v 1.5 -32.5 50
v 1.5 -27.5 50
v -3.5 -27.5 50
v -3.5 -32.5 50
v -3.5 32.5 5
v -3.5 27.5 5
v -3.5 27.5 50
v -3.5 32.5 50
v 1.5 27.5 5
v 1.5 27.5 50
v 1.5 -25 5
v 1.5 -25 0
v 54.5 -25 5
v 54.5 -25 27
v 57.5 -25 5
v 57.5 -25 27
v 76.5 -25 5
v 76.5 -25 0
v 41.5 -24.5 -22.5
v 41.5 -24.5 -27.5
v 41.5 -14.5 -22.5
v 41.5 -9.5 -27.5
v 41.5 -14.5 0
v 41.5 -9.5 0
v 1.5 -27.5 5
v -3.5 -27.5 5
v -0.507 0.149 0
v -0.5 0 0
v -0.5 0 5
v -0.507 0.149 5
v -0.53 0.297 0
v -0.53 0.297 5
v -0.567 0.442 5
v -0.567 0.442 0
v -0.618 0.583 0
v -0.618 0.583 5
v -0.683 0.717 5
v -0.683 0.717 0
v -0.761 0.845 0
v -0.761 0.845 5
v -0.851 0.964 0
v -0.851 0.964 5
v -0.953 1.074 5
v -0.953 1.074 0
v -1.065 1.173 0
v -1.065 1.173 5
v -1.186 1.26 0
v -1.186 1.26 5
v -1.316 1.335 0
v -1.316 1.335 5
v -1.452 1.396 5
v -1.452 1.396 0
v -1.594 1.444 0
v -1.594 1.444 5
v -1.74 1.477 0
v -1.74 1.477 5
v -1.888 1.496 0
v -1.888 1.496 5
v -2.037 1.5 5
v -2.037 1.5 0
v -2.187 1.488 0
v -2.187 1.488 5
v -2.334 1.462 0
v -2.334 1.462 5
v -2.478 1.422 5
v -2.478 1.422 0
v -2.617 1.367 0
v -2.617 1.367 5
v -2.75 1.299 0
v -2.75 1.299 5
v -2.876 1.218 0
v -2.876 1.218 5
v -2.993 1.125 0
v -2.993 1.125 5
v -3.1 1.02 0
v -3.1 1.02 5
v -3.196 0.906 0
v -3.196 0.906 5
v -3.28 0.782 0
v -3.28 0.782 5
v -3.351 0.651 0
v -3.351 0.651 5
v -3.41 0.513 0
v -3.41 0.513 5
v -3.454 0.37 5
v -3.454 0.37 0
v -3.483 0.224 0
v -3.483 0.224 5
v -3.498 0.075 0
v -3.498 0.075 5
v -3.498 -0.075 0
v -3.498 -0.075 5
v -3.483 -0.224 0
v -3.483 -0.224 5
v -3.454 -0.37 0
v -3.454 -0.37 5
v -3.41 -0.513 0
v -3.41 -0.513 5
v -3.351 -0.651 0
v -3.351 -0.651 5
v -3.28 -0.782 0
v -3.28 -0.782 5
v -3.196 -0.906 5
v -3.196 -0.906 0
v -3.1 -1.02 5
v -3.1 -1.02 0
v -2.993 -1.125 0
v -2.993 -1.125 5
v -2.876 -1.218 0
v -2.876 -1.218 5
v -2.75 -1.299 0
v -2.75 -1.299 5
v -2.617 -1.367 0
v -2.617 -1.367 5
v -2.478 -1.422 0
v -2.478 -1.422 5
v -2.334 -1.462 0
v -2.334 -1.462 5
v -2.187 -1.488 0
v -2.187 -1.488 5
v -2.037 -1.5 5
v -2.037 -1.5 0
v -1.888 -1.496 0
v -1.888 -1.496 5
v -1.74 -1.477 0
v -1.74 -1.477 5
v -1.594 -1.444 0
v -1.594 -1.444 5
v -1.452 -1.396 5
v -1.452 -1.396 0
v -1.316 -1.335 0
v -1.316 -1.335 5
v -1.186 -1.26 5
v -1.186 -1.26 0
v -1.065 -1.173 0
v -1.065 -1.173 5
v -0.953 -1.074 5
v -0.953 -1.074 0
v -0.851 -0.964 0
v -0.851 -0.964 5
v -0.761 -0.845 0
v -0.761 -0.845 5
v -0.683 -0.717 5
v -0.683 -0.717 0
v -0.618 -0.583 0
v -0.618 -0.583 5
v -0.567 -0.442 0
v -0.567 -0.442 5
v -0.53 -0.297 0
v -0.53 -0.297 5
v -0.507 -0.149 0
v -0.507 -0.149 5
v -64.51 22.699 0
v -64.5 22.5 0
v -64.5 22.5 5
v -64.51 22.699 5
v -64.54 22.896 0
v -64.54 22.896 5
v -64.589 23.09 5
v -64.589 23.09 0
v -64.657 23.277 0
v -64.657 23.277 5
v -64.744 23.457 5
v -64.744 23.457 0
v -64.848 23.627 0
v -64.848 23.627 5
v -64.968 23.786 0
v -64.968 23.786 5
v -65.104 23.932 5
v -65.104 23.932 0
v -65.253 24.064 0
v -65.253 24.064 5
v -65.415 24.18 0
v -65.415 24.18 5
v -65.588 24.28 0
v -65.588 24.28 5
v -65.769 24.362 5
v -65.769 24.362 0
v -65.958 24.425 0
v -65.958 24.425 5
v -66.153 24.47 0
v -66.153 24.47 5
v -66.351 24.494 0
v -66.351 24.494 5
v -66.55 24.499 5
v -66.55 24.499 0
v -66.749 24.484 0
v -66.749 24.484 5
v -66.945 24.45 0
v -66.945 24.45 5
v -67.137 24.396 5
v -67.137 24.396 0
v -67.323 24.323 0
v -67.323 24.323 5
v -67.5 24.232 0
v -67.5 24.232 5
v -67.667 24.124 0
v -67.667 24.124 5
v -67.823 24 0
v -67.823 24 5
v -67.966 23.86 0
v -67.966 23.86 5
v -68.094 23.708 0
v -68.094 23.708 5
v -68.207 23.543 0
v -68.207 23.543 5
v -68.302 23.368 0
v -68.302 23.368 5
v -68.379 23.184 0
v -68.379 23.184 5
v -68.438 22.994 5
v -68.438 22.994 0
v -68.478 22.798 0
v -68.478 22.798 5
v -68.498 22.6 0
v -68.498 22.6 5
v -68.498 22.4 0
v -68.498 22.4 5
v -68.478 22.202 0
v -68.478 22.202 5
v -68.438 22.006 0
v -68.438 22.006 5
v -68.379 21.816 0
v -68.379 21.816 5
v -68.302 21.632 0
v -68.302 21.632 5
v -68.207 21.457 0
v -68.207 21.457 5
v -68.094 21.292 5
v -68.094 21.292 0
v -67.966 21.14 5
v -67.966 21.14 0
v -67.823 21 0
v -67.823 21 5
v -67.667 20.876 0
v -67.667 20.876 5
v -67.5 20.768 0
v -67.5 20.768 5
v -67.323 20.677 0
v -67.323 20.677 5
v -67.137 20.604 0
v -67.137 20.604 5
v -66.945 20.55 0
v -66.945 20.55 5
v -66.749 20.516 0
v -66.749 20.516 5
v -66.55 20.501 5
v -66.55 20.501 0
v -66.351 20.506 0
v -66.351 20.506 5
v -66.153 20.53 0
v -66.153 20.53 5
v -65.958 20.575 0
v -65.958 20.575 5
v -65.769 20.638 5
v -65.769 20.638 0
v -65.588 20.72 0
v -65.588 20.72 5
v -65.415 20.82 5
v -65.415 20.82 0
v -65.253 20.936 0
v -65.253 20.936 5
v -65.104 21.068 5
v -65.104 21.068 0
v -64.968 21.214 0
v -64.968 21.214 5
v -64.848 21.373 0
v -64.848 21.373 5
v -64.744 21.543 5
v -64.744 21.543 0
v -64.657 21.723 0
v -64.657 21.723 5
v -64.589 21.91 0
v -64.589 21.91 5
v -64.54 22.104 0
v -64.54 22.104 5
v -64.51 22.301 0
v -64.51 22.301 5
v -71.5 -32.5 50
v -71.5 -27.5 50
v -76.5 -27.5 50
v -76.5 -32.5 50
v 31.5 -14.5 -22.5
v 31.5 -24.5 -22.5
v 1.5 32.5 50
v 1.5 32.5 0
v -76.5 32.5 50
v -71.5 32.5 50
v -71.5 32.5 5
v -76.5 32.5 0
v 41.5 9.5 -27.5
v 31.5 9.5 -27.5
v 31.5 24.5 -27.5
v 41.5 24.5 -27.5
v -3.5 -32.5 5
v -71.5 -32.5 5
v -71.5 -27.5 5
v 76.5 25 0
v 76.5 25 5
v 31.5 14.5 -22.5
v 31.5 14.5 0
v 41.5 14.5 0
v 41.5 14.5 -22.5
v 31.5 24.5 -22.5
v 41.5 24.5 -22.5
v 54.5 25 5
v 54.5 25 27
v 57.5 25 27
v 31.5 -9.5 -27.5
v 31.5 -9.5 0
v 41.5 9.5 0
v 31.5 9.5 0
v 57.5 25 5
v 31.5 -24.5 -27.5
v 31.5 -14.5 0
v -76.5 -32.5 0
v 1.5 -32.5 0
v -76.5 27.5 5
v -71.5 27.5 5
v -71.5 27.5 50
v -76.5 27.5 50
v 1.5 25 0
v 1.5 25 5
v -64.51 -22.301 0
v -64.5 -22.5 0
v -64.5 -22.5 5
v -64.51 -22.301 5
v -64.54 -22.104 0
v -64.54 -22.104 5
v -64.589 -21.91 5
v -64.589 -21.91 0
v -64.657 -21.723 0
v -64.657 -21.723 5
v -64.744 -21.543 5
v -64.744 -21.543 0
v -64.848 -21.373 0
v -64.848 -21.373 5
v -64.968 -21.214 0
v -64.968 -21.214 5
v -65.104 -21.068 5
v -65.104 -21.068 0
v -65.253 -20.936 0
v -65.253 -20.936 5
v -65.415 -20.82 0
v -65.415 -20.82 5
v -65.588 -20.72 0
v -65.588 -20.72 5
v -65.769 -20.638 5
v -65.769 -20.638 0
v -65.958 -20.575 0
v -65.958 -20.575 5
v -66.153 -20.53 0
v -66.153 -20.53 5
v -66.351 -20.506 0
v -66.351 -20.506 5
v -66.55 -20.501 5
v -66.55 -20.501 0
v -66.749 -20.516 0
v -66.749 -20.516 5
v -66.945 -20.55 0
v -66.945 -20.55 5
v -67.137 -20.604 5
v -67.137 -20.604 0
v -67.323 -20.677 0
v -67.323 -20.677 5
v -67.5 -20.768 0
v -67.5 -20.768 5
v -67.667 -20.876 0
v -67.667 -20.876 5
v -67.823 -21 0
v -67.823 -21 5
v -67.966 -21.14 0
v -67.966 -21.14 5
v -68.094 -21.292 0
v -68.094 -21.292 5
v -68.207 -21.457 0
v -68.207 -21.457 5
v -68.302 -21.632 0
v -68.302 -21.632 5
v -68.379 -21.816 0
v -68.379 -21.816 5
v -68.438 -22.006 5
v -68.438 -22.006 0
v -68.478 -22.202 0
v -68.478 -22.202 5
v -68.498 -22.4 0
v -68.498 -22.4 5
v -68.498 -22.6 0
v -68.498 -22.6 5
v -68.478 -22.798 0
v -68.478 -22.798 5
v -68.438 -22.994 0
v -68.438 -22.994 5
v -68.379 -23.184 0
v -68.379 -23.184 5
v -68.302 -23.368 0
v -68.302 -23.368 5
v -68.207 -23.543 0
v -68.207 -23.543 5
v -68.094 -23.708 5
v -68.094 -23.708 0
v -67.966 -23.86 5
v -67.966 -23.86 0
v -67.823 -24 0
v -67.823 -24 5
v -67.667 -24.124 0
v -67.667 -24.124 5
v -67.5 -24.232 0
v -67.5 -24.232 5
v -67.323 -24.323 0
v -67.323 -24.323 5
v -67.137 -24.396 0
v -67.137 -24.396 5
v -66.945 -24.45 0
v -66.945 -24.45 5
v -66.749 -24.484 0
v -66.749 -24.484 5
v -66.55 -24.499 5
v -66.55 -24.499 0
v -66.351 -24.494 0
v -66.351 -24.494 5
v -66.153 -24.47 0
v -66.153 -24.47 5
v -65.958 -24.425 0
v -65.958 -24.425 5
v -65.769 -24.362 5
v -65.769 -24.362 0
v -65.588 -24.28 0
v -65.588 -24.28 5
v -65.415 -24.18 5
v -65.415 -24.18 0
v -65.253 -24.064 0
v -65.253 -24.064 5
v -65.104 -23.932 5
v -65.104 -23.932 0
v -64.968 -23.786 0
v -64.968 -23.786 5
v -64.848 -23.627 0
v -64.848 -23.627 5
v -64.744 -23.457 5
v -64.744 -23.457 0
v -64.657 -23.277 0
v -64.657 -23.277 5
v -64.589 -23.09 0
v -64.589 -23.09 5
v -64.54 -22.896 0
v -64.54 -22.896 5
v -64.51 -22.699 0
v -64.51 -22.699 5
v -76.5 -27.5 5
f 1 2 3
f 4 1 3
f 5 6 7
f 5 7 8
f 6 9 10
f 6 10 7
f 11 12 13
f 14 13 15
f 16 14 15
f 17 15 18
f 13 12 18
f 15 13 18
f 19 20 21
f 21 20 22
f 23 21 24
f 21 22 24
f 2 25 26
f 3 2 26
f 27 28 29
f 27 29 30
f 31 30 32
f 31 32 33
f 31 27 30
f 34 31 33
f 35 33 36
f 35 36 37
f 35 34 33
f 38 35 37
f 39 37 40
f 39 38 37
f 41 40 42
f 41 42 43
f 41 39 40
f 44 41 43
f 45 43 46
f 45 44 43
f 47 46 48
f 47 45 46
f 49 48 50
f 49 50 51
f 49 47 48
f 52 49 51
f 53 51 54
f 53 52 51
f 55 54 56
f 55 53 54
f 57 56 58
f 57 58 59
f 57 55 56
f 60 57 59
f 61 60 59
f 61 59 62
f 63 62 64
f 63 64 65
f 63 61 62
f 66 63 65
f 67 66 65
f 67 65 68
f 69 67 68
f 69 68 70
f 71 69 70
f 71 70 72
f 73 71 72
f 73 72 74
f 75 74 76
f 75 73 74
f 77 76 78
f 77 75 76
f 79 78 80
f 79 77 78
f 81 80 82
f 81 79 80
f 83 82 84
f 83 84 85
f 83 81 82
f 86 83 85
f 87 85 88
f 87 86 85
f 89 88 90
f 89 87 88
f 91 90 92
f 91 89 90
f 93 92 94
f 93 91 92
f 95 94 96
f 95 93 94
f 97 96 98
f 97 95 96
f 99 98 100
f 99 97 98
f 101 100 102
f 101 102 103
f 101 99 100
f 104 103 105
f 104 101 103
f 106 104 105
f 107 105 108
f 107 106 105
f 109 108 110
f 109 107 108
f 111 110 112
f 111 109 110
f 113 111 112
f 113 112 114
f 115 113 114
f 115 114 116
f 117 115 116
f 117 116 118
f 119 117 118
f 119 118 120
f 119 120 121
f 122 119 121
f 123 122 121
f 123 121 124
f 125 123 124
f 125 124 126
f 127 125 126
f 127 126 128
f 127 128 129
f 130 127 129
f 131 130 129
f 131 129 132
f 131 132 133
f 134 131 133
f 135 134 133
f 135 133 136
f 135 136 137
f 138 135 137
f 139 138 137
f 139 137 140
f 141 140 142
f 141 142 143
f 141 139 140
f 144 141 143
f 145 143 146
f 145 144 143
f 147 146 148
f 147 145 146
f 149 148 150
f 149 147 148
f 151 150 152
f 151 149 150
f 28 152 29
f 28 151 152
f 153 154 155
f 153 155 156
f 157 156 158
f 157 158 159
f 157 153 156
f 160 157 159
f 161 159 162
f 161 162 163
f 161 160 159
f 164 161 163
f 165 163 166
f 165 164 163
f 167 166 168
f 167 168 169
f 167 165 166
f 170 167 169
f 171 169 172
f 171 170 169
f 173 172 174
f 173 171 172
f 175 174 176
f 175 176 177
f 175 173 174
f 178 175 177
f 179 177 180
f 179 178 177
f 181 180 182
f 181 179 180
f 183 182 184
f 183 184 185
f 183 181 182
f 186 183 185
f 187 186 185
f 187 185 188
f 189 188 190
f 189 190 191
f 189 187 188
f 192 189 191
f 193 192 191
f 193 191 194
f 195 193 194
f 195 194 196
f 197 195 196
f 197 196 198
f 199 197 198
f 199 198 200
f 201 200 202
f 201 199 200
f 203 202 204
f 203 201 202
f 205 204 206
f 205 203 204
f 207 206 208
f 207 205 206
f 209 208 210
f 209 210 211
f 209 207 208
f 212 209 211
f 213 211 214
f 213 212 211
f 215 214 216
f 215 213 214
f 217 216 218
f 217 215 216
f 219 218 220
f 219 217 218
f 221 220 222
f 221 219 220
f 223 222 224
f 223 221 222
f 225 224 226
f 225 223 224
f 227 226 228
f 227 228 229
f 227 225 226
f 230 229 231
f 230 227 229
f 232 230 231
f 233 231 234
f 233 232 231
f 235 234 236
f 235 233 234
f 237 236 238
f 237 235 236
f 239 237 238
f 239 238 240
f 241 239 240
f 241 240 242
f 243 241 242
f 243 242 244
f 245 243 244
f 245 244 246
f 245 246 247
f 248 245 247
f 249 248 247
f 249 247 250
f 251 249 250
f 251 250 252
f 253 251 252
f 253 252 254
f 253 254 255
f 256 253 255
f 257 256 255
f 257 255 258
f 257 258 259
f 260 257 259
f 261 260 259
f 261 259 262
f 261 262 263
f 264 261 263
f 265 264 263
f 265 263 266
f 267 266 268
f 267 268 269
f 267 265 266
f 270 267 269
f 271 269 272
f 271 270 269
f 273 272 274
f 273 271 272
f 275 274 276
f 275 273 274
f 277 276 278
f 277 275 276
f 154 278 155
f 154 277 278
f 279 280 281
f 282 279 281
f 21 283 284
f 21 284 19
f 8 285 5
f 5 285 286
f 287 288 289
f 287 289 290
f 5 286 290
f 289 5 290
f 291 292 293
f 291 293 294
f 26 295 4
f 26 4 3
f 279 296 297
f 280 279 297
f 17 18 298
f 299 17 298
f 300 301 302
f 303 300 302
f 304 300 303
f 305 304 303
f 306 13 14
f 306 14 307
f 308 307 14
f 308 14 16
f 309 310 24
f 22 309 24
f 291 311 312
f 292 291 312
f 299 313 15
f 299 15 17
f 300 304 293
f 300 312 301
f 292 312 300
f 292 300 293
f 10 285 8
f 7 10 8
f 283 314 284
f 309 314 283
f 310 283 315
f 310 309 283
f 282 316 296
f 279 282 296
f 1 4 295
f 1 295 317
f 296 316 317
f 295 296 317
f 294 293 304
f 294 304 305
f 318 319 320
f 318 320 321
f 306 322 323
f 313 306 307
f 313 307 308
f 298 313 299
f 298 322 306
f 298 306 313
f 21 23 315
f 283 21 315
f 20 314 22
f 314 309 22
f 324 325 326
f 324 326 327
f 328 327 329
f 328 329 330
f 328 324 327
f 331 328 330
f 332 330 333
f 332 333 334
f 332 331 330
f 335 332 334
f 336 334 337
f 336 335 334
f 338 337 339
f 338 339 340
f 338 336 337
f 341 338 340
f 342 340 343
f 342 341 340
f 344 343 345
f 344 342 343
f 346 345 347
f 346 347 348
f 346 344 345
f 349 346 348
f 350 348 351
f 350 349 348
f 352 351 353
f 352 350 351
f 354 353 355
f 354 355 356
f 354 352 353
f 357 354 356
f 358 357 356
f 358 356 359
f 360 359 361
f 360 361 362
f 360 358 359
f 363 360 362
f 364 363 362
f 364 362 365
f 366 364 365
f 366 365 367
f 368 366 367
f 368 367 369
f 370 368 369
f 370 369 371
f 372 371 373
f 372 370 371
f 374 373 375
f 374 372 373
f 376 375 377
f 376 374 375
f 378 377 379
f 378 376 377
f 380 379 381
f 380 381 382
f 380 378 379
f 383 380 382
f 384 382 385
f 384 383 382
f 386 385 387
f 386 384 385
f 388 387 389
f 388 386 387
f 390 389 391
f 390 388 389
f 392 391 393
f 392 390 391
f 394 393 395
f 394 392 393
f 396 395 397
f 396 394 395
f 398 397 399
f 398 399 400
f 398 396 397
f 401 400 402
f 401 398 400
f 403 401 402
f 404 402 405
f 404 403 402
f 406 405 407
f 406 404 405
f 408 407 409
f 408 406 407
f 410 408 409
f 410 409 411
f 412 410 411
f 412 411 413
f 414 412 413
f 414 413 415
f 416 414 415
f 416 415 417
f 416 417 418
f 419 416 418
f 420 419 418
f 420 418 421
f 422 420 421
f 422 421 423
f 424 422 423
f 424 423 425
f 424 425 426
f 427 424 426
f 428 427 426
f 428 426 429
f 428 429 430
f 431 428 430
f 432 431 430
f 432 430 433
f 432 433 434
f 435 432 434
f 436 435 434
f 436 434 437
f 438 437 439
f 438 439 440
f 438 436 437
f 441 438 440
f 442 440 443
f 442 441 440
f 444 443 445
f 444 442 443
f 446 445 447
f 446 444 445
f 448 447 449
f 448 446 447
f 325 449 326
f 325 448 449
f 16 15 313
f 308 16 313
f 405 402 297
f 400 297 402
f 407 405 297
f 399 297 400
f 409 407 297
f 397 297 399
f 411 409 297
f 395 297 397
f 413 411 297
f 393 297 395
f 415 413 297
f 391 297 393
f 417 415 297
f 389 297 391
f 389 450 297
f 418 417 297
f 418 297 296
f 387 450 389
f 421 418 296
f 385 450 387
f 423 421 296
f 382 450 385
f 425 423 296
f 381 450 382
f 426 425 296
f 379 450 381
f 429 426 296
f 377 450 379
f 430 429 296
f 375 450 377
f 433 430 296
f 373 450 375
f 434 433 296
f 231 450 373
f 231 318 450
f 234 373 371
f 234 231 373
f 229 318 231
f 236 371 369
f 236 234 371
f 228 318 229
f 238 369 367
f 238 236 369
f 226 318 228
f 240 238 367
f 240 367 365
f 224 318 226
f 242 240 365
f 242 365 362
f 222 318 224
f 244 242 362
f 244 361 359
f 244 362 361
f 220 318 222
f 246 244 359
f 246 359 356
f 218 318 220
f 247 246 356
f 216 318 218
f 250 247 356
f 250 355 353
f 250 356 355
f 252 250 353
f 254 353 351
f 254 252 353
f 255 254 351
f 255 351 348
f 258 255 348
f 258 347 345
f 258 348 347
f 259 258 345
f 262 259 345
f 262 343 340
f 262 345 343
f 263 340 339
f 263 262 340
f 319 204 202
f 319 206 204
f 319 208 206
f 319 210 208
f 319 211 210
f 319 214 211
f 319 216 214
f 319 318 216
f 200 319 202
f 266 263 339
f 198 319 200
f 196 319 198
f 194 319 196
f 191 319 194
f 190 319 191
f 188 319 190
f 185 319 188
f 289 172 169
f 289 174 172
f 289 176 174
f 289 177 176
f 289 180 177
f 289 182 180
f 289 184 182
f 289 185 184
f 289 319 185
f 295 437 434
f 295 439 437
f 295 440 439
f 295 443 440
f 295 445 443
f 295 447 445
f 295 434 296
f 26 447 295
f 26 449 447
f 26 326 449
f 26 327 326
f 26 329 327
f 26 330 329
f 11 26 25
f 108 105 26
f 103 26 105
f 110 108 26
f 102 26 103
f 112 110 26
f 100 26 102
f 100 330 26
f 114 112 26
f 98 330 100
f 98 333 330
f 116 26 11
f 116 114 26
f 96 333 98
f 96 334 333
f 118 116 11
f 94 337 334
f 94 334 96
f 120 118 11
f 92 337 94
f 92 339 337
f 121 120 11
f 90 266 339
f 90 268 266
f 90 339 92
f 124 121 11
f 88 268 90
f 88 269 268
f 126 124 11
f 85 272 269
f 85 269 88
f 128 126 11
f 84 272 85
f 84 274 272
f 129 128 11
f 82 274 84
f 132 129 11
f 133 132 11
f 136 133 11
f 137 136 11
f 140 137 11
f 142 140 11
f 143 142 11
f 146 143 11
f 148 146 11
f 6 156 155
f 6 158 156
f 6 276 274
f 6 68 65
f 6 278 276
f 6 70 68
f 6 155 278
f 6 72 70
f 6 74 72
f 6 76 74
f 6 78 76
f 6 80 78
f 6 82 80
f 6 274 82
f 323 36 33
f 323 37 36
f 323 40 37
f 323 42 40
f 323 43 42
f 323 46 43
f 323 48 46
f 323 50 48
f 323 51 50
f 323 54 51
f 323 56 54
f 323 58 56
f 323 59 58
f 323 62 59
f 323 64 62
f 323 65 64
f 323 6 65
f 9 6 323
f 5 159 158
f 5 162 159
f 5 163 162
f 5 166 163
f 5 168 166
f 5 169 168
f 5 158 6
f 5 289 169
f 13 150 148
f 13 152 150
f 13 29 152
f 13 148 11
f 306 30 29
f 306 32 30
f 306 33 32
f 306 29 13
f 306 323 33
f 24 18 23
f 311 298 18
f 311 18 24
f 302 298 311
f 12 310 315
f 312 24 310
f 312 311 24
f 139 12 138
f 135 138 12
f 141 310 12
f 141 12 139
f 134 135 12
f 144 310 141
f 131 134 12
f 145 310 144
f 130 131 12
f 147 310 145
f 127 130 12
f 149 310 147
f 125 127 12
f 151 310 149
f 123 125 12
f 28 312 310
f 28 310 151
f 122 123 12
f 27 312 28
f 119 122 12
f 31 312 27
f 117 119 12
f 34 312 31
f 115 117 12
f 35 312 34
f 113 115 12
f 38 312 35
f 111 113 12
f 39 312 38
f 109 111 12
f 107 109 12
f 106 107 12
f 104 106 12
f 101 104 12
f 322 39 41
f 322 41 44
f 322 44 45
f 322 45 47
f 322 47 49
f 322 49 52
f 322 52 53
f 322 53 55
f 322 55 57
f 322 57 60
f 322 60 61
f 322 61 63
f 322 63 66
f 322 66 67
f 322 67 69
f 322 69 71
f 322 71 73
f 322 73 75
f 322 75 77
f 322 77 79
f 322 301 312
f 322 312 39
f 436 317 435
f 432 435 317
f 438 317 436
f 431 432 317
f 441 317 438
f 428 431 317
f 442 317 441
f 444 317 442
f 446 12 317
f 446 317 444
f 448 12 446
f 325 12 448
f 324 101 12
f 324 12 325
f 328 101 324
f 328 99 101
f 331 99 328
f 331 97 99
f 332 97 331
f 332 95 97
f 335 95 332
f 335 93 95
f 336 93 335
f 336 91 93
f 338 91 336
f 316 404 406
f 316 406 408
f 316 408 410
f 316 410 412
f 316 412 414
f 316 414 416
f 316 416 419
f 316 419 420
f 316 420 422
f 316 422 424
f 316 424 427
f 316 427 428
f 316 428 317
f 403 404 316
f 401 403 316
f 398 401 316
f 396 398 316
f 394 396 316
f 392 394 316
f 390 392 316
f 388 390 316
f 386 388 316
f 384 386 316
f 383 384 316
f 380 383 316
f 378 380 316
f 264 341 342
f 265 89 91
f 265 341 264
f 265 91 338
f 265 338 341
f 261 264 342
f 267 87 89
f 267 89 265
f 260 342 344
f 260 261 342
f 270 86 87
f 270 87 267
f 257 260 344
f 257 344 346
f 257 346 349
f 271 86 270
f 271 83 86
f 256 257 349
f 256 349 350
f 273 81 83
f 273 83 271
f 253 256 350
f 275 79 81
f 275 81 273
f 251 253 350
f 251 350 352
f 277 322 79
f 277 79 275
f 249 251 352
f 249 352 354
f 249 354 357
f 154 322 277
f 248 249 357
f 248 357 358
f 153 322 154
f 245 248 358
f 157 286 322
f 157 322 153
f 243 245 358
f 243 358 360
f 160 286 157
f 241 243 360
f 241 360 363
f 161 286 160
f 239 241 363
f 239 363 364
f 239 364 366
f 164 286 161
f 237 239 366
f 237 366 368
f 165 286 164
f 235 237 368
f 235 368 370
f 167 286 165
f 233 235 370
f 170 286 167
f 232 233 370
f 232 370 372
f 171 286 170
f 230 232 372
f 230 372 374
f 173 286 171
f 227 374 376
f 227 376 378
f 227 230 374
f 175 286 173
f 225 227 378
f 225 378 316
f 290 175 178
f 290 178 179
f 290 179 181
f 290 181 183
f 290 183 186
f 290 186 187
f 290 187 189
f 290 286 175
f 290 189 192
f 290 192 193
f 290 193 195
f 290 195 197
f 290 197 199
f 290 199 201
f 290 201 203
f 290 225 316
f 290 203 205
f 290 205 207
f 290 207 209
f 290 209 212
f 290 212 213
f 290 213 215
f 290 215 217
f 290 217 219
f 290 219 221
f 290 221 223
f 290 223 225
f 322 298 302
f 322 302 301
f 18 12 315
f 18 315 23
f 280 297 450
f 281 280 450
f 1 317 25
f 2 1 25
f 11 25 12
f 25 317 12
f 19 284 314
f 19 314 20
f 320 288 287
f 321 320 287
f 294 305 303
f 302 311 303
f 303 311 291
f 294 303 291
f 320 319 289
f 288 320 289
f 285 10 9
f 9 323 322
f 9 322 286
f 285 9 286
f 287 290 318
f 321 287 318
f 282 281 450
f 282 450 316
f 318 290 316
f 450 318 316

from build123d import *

# Parameters (mm, degrees)
CROQUIS1_R               = 2
CROQUIS1_R_2             = 1.5
SALIENTE_EXTRUIR4_DEPTH  = 5
CROQUIS3_W               = 5
CROQUIS3_H               = 5
SALIENTE_EXTRUIR5_DEPTH  = 50
CROQUIS4_W               = 3
CROQUIS4_H               = 50
SALIENTE_EXTRUIR7_DEPTH  = 22
CROQUIS6_W               = 10
CROQUIS6_H               = 5
SALIENTE_EXTRUIR9_DEPTH  = 27.5
CROQUIS7_W               = 10
CROQUIS7_H               = 5
SALIENTE_EXTRUIR10_DEPTH = 10
CROQUIS8_W               = 10
CROQUIS8_H               = 5
SALIENTE_EXTRUIR11_DEPTH = 10


with BuildPart() as part:
    # Croquis1 → Saliente-Extruir4 (new body)
    with BuildSketch(Plane.XY):
        Polygon((-71.5, -27.5), (-71.5, -32.5), (-3.5, -32.5), (-3.5, -27.5), (1.5, -27.5), (1.5, -25), (76.5, -25), (76.5, 25), (1.5, 25), (1.5, 27.5), (-3.5, 27.5), (-3.5, 32.5), (-71.5, 32.5), (-71.5, 27.5), (-76.5, 27.5), (-76.5, -27.5), align=None)
        with Locations((-66.5, -22.5)):
            Circle(CROQUIS1_R, mode=Mode.SUBTRACT)
        with Locations((-2, 0)):
            Circle(CROQUIS1_R_2, mode=Mode.SUBTRACT)
        with Locations((-66.5, 22.5)):
            Circle(CROQUIS1_R, mode=Mode.SUBTRACT)
    extrude(amount=SALIENTE_EXTRUIR4_DEPTH)

    # Croquis3 → Saliente-Extruir5 (add)
    with BuildSketch(Plane(origin=(0, 0, 0), x_dir=(-1, 0, 0), z_dir=(0, 0, -1))):
        with Locations((74, 30)):
            Rectangle(CROQUIS3_W, CROQUIS3_H)
        with Locations((1, -30)):
            Rectangle(CROQUIS3_W, CROQUIS3_H)
        with Locations((1, 30)):
            Rectangle(CROQUIS3_W, CROQUIS3_H)
        with Locations((74, -30)):
            Rectangle(CROQUIS3_W, CROQUIS3_H)
    extrude(amount=-SALIENTE_EXTRUIR5_DEPTH)

    # Croquis4 → Saliente-Extruir7 (add)
    with BuildSketch(Plane.XY.offset(5)):
        with Locations((56, 0)):
            Rectangle(CROQUIS4_W, CROQUIS4_H)
    extrude(amount=SALIENTE_EXTRUIR7_DEPTH)

    # Croquis6 → Saliente-Extruir9 (add)
    with BuildSketch(Plane(origin=(0, 0, 0), x_dir=(-1, 0, 0), z_dir=(0, 0, -1))):
        with Locations((-36.5, 12)):
            Rectangle(CROQUIS6_W, CROQUIS6_H)
        with Locations((-36.5, -12)):
            Rectangle(CROQUIS6_W, CROQUIS6_H)
    extrude(amount=SALIENTE_EXTRUIR9_DEPTH)

    # Croquis7 → Saliente-Extruir10 (add)
    with BuildSketch(Plane(origin=(0, 14.5, 0), x_dir=(1, 0, 0), z_dir=(0, 1, 0))):
        with Locations((36.5, 25)):
            Rectangle(CROQUIS7_W, CROQUIS7_H)
    extrude(amount=SALIENTE_EXTRUIR10_DEPTH)

    # Croquis8 → Saliente-Extruir11 (add)
    with BuildSketch(Plane.XZ.offset(14.5)):
        with Locations((36.5, -25)):
            Rectangle(CROQUIS8_W, CROQUIS8_H)
    extrude(amount=SALIENTE_EXTRUIR11_DEPTH)


solid = part.part
